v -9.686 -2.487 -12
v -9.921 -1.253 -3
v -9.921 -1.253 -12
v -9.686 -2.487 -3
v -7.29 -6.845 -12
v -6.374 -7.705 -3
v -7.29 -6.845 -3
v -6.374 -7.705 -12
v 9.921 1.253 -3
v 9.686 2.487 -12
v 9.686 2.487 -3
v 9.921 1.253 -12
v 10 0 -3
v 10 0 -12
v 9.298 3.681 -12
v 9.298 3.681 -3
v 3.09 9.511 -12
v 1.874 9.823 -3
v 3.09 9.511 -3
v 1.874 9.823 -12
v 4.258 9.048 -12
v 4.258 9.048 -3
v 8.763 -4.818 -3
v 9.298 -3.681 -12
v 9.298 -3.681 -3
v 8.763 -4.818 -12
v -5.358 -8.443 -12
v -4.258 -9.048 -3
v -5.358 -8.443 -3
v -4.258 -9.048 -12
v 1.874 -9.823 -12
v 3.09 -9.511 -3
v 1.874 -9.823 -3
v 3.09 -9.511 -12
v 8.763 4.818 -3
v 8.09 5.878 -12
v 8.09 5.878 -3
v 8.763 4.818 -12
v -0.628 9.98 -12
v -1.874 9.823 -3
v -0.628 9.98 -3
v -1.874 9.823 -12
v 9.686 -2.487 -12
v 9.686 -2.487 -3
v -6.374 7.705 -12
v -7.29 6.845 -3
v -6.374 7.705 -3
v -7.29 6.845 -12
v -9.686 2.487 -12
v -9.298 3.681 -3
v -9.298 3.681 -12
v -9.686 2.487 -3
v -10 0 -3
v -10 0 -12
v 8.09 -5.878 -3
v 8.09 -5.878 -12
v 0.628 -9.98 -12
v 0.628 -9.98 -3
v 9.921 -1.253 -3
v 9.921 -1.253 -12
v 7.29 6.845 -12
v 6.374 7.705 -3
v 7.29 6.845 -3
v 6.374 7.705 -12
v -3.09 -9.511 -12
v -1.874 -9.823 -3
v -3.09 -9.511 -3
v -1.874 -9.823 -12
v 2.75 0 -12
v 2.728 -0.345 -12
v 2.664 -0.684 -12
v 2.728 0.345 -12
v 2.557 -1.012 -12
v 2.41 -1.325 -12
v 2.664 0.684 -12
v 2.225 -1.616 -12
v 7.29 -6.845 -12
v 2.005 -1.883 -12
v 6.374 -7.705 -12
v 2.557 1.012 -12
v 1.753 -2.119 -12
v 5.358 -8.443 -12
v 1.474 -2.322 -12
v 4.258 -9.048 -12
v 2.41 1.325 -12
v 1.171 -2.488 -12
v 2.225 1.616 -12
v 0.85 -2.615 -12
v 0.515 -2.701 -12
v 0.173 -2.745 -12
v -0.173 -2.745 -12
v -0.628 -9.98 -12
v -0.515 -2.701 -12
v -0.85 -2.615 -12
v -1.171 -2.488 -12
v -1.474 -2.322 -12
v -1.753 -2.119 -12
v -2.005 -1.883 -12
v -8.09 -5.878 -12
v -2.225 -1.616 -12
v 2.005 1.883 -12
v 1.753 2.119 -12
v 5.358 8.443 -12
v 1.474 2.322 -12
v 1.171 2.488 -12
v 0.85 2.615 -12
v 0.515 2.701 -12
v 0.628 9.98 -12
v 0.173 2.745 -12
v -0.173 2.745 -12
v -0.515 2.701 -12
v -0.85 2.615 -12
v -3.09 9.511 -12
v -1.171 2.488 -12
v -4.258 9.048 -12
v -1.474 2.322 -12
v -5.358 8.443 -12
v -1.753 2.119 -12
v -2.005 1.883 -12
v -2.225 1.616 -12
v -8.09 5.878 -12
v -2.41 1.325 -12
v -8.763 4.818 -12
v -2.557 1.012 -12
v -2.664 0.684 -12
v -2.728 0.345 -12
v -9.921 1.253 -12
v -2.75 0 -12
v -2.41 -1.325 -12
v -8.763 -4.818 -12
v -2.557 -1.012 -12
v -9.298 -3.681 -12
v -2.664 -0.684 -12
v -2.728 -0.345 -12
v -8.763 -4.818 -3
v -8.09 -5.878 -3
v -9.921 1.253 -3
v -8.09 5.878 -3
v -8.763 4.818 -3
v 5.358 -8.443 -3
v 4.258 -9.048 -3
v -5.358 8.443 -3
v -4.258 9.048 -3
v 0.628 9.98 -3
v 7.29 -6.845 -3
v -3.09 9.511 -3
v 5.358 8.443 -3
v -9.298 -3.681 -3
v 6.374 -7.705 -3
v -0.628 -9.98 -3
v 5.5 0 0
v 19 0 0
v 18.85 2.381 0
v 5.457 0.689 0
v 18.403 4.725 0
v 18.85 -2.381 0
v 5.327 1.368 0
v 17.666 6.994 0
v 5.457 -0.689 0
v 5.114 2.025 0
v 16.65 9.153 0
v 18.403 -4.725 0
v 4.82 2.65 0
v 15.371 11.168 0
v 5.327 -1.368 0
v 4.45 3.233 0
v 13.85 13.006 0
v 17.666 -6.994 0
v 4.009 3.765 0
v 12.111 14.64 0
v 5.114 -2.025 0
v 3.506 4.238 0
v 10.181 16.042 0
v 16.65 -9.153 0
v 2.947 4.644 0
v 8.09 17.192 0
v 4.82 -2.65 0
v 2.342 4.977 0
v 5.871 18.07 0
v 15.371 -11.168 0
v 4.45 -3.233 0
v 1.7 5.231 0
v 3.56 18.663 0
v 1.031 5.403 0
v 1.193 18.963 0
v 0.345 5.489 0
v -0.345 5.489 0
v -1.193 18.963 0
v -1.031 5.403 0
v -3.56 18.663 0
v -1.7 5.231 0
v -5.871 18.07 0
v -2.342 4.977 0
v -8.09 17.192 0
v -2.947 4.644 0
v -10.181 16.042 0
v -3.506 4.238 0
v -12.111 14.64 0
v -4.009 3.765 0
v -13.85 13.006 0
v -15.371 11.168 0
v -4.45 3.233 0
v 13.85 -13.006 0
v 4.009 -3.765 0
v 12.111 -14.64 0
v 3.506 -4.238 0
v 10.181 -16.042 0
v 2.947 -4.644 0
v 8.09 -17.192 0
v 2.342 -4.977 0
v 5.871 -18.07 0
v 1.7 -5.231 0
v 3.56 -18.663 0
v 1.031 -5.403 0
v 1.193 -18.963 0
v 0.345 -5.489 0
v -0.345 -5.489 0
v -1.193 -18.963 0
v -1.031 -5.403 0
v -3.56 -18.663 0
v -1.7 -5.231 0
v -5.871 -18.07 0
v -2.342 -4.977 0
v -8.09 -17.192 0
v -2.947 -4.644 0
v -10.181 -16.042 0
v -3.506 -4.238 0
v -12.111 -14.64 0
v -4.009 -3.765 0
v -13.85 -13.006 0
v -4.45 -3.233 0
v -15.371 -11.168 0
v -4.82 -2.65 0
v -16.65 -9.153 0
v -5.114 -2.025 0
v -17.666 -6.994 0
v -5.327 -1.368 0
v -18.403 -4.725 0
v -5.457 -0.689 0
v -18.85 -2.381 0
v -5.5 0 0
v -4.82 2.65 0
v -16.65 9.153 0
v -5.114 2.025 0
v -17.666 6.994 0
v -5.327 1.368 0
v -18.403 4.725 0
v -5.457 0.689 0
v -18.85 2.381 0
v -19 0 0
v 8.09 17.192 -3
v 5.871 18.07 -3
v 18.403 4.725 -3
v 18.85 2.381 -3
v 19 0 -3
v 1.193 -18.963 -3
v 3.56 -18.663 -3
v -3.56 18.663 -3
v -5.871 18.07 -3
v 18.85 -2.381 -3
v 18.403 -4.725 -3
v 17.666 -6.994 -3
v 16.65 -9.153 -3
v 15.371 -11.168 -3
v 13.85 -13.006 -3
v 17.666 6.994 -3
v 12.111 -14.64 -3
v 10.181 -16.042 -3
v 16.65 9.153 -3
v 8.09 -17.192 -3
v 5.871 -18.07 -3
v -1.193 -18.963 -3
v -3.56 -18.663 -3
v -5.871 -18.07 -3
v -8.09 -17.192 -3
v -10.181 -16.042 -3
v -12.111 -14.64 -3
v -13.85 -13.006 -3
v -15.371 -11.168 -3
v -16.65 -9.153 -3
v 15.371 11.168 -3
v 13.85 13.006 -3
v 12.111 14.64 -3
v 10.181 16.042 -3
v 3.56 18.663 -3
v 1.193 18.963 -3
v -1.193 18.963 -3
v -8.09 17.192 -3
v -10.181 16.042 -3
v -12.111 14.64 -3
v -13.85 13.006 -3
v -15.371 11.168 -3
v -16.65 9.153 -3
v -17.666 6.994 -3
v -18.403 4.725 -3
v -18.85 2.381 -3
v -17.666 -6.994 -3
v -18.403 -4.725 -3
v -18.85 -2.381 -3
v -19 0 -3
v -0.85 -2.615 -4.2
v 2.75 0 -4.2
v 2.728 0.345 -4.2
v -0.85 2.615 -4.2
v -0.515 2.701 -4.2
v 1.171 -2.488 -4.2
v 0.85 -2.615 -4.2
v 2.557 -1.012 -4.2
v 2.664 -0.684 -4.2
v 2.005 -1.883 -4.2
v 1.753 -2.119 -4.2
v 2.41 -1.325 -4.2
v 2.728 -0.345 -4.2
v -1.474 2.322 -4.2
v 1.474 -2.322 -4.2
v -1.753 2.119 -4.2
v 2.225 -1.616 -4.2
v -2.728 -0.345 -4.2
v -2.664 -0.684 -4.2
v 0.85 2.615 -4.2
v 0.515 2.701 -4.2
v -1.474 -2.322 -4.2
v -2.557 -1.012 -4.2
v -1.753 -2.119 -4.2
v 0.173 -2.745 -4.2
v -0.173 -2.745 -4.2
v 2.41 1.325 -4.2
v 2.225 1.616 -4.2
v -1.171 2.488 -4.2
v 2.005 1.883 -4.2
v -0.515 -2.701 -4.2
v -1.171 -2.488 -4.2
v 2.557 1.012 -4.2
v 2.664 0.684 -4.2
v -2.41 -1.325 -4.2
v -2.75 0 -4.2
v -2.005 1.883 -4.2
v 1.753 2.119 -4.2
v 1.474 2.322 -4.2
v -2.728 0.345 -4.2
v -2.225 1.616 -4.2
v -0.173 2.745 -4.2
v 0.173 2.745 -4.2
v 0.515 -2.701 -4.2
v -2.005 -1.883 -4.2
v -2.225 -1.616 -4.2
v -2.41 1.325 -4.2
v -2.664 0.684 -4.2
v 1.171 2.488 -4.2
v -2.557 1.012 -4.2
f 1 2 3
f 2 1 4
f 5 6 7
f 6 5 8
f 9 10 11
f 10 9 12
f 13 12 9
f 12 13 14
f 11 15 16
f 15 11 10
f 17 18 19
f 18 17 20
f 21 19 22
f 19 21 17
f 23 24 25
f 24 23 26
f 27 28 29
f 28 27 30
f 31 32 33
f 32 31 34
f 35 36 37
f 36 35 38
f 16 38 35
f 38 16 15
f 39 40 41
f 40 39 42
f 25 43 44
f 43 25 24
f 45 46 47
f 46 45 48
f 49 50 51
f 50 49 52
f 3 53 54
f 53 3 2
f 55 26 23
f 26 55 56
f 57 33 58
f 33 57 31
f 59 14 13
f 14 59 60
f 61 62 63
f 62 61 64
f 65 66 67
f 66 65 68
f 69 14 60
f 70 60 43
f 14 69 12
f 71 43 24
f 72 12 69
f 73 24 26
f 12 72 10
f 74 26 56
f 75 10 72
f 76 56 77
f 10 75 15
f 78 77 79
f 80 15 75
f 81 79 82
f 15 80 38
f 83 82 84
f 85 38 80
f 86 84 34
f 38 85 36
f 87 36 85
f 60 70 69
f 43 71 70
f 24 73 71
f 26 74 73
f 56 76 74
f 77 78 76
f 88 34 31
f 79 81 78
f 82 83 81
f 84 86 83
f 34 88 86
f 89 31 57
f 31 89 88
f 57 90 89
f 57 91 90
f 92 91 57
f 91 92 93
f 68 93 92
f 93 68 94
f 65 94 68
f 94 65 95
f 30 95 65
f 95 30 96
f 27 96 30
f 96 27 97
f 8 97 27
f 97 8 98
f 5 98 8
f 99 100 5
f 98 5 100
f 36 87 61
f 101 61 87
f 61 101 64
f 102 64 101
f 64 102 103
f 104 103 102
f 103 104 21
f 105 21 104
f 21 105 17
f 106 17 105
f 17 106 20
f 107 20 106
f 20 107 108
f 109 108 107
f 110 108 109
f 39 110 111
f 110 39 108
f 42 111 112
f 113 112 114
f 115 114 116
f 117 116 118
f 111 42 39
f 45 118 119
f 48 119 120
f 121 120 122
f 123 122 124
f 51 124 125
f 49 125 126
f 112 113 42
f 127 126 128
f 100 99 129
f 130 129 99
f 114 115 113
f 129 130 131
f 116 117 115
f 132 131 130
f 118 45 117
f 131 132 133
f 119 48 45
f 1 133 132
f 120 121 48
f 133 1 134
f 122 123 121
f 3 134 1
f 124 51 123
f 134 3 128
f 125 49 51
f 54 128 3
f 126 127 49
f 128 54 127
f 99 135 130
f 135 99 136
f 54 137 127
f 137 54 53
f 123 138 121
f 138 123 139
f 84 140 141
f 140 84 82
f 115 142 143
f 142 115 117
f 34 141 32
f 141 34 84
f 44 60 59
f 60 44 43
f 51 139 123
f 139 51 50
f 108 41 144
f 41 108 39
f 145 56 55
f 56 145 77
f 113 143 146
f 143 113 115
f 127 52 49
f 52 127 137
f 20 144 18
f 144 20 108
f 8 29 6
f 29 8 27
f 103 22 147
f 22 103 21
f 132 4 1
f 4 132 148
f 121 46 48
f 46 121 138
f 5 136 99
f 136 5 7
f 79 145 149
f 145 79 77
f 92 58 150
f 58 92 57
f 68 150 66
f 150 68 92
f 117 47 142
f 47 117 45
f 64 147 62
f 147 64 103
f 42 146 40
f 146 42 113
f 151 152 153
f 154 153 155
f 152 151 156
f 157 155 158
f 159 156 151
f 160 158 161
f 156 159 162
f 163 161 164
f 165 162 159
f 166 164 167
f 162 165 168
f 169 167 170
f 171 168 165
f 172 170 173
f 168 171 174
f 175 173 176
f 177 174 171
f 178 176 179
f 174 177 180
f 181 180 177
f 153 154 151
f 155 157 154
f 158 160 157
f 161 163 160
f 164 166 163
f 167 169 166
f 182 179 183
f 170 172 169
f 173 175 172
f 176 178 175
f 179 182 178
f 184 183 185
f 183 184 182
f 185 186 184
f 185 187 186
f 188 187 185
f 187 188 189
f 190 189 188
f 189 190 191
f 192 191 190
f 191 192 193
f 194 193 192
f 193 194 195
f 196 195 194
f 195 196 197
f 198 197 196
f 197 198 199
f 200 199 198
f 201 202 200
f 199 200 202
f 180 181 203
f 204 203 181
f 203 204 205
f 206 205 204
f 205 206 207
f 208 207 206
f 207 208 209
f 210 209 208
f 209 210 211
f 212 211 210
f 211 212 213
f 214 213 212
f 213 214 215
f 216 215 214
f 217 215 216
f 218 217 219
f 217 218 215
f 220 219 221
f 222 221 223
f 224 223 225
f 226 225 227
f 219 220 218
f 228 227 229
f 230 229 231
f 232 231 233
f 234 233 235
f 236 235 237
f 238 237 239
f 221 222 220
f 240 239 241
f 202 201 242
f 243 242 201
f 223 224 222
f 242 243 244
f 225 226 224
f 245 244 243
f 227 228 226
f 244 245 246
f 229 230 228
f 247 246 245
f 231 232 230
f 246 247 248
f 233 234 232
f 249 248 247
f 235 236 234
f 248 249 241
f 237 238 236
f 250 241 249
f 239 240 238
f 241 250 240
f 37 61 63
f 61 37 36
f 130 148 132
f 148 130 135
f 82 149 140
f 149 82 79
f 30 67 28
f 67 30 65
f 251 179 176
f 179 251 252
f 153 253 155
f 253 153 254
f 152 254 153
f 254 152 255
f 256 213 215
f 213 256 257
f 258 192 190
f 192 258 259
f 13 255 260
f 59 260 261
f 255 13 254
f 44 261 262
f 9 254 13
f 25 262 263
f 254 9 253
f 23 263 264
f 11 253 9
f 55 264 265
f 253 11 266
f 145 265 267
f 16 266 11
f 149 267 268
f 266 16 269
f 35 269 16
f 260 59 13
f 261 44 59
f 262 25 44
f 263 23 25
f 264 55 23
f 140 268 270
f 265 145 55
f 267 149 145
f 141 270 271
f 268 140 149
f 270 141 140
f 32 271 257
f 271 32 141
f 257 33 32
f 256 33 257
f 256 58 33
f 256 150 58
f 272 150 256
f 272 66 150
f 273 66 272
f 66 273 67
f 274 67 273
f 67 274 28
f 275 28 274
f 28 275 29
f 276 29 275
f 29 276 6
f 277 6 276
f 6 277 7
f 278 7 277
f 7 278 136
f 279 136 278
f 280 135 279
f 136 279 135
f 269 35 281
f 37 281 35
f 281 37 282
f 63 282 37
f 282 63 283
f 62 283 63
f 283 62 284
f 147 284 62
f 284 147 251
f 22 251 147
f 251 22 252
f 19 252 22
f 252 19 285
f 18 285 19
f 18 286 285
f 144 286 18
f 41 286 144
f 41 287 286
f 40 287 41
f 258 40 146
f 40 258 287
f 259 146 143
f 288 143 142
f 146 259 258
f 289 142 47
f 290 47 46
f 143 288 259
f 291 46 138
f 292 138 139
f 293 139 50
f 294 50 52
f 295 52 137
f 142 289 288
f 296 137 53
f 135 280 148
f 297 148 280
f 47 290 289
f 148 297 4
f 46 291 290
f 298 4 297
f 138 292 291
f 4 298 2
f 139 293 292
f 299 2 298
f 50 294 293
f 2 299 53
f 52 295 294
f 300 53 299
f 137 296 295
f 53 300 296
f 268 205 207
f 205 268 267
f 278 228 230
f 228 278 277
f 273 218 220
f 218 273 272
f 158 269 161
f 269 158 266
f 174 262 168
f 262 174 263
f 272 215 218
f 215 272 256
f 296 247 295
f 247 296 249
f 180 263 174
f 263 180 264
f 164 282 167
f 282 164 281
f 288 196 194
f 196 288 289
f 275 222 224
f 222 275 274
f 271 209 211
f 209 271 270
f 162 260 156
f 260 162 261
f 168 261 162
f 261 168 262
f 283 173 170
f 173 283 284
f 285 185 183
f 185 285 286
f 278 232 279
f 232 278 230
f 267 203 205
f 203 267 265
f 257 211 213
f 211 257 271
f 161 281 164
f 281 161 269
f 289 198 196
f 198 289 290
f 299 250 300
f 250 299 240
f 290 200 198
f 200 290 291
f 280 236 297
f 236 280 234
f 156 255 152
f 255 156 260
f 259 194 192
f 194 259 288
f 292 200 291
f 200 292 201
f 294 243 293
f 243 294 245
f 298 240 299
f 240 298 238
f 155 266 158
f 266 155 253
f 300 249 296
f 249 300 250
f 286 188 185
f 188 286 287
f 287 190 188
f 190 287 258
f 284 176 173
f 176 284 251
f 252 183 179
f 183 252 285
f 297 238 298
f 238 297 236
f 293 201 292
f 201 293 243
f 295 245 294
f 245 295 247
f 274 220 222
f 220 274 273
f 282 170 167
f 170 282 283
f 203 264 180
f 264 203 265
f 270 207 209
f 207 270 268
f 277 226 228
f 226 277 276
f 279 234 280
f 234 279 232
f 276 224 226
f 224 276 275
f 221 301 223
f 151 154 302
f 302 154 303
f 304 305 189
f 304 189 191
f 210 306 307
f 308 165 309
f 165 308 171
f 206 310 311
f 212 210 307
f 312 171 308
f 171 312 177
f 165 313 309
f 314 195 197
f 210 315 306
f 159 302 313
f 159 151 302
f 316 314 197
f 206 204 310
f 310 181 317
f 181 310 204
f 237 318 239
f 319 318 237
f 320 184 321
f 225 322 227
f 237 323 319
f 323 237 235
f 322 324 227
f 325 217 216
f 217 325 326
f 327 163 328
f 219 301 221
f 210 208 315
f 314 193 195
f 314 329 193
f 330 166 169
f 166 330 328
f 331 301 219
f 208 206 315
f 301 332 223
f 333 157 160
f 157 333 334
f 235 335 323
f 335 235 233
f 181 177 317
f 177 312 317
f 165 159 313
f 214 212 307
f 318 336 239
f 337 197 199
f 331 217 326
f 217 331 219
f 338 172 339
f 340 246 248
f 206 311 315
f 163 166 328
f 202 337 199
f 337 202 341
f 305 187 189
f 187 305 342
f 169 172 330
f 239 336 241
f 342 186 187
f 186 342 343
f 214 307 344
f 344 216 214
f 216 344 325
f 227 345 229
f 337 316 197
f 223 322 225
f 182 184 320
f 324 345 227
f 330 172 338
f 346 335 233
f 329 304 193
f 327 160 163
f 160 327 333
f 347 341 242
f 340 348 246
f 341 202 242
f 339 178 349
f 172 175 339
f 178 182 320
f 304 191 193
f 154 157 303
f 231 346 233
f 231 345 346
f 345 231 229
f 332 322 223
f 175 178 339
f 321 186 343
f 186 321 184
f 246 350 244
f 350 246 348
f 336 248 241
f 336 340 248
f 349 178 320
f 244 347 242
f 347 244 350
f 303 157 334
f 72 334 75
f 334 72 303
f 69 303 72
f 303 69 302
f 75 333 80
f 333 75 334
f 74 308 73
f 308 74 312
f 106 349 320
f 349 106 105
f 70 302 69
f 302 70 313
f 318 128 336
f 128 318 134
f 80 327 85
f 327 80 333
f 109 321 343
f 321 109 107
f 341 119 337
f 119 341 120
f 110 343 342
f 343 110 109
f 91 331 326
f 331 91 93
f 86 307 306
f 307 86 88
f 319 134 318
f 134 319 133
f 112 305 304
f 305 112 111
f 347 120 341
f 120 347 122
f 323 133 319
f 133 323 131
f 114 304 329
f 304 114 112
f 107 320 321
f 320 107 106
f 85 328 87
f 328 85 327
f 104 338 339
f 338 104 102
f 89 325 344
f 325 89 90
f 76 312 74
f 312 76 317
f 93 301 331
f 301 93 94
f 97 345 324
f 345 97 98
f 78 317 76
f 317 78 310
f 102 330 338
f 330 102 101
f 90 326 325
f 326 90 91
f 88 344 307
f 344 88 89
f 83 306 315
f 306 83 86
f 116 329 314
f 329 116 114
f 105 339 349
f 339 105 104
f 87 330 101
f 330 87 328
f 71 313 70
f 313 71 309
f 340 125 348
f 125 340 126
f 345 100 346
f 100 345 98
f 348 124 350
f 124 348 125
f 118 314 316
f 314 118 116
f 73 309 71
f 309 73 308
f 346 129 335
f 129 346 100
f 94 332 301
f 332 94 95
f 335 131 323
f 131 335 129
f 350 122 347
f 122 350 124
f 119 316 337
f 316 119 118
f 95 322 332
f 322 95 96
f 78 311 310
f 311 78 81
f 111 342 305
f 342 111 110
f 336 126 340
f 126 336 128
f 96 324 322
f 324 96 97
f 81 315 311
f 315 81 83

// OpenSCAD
$fn = 50;


difference() {
	union() {
		translate(v = [0, 0, -12.0000000000]) {
			cylinder(h = 12, r = 10.0000000000);
		}
		translate(v = [0, 0, -3.0000000000]) {
			cylinder(h = 3, r = 19.0000000000);
		}
	}
	union() {
		translate(v = [0, 0, 0]) {
			rotate(a = [0, 0, 0]) {
				difference() {
					union() {
						#translate(v = [0, 0, -12.0000000000]) {
							cylinder(h = 12, r = 2.2500000000);
						}
						#translate(v = [0, 0, -4.2000000000]) {
							cylinder(h = 4.2000000000, r1 = 2.7500000000, r2 = 5.5000000000);
						}
						#translate(v = [0, 0, -12.0000000000]) {
							cylinder(h = 12, r = 2.7500000000);
						}
						#translate(v = [0, 0, -12.0000000000]) {
							cylinder(h = 12, r = 2.2500000000);
						}
					}
					union();
				}
			}
		}
	}
}
